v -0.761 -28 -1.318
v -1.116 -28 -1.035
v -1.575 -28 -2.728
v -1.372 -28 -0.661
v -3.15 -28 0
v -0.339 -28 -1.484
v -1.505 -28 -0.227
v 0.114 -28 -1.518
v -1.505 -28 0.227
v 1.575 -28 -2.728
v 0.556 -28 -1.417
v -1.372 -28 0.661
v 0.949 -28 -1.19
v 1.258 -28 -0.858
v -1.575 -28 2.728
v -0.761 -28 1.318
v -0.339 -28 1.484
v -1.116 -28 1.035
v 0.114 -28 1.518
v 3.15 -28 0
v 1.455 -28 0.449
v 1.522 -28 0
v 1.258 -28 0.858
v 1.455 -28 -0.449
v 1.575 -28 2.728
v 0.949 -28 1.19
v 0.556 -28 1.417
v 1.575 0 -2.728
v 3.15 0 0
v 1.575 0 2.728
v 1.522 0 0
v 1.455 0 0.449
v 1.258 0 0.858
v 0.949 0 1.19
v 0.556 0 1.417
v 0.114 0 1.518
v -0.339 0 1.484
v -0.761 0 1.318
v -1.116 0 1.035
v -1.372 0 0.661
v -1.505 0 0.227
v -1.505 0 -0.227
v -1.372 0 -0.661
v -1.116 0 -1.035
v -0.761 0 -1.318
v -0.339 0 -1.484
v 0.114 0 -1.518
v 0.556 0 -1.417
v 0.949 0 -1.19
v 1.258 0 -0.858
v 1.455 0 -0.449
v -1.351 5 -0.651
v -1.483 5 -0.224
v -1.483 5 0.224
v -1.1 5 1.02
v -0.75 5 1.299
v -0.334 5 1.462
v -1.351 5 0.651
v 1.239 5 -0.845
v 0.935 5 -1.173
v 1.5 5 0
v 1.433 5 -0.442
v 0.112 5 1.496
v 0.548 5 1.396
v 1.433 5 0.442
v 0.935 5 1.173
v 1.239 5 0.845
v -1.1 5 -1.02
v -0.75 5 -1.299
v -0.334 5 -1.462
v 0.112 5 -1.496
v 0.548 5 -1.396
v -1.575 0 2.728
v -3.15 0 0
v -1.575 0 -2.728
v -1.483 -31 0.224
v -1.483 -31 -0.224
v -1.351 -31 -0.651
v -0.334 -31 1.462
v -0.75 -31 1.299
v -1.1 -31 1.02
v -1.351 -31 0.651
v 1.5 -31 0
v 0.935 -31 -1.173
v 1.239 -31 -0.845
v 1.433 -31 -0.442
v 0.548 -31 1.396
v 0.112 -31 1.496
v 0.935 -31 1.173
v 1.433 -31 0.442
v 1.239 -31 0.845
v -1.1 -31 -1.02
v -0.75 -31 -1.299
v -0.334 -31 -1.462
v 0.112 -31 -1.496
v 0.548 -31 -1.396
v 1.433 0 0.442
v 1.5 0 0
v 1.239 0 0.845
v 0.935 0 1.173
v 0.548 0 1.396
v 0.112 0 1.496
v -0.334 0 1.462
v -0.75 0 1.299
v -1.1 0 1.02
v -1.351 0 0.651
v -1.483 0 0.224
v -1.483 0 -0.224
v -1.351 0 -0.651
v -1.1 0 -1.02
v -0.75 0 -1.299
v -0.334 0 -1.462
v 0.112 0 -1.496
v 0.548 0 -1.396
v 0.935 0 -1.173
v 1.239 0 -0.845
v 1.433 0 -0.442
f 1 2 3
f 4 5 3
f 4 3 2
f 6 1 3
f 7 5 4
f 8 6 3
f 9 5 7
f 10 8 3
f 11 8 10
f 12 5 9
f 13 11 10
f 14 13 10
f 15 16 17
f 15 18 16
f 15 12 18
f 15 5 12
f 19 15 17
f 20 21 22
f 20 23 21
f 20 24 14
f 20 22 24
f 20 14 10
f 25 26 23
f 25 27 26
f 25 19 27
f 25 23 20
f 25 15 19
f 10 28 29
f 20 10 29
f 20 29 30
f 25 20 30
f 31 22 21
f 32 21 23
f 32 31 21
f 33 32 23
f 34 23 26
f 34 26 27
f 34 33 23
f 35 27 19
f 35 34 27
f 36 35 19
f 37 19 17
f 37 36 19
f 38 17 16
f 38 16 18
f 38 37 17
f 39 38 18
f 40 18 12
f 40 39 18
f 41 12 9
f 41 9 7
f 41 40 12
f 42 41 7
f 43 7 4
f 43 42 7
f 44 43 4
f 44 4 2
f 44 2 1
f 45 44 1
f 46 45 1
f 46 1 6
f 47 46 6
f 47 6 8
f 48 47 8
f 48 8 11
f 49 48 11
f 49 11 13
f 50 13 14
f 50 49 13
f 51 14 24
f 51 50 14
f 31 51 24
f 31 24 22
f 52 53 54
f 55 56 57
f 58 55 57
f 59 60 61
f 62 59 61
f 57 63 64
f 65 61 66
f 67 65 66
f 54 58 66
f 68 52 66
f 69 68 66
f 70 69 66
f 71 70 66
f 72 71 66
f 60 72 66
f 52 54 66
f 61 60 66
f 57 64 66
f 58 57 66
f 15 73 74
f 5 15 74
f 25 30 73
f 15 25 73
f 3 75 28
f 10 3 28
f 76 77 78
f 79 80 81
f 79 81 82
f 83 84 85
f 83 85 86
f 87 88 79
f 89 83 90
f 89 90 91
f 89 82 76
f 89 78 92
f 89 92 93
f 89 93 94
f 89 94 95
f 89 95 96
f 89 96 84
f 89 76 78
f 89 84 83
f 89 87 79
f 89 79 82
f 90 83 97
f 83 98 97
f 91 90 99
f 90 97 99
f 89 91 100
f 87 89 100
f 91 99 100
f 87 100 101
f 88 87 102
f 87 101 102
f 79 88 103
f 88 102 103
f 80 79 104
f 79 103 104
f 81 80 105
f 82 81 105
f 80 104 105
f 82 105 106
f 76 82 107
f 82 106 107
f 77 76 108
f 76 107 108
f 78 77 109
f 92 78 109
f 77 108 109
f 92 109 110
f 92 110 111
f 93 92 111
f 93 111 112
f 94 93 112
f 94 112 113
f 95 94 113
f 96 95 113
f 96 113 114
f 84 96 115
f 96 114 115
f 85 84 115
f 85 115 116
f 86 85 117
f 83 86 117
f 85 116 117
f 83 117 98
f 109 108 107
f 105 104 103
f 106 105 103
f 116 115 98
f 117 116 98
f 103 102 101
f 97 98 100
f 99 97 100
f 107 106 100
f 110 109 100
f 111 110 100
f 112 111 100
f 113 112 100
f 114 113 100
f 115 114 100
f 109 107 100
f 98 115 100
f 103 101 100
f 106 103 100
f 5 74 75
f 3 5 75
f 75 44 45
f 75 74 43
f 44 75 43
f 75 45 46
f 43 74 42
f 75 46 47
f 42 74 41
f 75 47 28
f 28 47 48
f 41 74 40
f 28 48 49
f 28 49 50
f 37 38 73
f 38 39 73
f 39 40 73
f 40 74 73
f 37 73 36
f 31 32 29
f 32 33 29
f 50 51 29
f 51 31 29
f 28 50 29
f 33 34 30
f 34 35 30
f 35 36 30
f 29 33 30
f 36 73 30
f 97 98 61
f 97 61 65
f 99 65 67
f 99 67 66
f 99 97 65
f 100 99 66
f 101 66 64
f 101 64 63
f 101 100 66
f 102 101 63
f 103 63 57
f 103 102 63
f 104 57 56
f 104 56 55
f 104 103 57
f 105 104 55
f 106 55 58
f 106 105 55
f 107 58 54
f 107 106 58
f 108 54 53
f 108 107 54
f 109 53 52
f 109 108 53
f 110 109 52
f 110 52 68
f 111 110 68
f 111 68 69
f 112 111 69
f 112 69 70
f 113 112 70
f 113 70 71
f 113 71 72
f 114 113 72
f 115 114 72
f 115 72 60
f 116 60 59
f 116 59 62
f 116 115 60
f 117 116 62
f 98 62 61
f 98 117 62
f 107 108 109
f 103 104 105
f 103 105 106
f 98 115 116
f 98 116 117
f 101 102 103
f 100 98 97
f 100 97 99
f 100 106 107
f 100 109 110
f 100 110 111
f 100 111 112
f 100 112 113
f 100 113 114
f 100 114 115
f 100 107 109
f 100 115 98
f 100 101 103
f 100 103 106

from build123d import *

# Parameters (mm, degrees)
F0_R     = 1.5223329882
F1_DEPTH = 28
F0_R_2   = 1.5
F2_DEPTH = 5
F3_DEPTH = 3


with BuildPart() as f1:
    # F0 (on Front) → F1 (new body)
    with BuildSketch(Plane.XZ):
        Polygon((-1.575, -2.7279800219), (1.575, -2.7279800219), (3.15, 0), (1.575, 2.7279800219), (-1.575, 2.7279800219), (-3.15, 0), align=None)
        Circle(F0_R, mode=Mode.SUBTRACT)
    extrude(amount=F1_DEPTH)


with BuildPart() as f1b:
    # F0 (on Front) → F1, piece 2 (new body)
    with BuildSketch(Plane.XZ):
        Circle(F0_R_2)
    extrude(amount=F1_DEPTH)

    # F3 (add): a face of the model
    f3_faces = [f1b.faces().sort_by_distance(p)[0] for p in [
        (0, -28, 0),
    ]]
    extrude(f3_faces, amount=F3_DEPTH)


with BuildPart() as f2:
    # F0 (on Front) → F2 (new body)
    with BuildSketch(Plane.XZ):
        Circle(F0_R_2)
    extrude(amount=-F2_DEPTH)


solid = Compound([f1.part, f1b.part, f2.part])
